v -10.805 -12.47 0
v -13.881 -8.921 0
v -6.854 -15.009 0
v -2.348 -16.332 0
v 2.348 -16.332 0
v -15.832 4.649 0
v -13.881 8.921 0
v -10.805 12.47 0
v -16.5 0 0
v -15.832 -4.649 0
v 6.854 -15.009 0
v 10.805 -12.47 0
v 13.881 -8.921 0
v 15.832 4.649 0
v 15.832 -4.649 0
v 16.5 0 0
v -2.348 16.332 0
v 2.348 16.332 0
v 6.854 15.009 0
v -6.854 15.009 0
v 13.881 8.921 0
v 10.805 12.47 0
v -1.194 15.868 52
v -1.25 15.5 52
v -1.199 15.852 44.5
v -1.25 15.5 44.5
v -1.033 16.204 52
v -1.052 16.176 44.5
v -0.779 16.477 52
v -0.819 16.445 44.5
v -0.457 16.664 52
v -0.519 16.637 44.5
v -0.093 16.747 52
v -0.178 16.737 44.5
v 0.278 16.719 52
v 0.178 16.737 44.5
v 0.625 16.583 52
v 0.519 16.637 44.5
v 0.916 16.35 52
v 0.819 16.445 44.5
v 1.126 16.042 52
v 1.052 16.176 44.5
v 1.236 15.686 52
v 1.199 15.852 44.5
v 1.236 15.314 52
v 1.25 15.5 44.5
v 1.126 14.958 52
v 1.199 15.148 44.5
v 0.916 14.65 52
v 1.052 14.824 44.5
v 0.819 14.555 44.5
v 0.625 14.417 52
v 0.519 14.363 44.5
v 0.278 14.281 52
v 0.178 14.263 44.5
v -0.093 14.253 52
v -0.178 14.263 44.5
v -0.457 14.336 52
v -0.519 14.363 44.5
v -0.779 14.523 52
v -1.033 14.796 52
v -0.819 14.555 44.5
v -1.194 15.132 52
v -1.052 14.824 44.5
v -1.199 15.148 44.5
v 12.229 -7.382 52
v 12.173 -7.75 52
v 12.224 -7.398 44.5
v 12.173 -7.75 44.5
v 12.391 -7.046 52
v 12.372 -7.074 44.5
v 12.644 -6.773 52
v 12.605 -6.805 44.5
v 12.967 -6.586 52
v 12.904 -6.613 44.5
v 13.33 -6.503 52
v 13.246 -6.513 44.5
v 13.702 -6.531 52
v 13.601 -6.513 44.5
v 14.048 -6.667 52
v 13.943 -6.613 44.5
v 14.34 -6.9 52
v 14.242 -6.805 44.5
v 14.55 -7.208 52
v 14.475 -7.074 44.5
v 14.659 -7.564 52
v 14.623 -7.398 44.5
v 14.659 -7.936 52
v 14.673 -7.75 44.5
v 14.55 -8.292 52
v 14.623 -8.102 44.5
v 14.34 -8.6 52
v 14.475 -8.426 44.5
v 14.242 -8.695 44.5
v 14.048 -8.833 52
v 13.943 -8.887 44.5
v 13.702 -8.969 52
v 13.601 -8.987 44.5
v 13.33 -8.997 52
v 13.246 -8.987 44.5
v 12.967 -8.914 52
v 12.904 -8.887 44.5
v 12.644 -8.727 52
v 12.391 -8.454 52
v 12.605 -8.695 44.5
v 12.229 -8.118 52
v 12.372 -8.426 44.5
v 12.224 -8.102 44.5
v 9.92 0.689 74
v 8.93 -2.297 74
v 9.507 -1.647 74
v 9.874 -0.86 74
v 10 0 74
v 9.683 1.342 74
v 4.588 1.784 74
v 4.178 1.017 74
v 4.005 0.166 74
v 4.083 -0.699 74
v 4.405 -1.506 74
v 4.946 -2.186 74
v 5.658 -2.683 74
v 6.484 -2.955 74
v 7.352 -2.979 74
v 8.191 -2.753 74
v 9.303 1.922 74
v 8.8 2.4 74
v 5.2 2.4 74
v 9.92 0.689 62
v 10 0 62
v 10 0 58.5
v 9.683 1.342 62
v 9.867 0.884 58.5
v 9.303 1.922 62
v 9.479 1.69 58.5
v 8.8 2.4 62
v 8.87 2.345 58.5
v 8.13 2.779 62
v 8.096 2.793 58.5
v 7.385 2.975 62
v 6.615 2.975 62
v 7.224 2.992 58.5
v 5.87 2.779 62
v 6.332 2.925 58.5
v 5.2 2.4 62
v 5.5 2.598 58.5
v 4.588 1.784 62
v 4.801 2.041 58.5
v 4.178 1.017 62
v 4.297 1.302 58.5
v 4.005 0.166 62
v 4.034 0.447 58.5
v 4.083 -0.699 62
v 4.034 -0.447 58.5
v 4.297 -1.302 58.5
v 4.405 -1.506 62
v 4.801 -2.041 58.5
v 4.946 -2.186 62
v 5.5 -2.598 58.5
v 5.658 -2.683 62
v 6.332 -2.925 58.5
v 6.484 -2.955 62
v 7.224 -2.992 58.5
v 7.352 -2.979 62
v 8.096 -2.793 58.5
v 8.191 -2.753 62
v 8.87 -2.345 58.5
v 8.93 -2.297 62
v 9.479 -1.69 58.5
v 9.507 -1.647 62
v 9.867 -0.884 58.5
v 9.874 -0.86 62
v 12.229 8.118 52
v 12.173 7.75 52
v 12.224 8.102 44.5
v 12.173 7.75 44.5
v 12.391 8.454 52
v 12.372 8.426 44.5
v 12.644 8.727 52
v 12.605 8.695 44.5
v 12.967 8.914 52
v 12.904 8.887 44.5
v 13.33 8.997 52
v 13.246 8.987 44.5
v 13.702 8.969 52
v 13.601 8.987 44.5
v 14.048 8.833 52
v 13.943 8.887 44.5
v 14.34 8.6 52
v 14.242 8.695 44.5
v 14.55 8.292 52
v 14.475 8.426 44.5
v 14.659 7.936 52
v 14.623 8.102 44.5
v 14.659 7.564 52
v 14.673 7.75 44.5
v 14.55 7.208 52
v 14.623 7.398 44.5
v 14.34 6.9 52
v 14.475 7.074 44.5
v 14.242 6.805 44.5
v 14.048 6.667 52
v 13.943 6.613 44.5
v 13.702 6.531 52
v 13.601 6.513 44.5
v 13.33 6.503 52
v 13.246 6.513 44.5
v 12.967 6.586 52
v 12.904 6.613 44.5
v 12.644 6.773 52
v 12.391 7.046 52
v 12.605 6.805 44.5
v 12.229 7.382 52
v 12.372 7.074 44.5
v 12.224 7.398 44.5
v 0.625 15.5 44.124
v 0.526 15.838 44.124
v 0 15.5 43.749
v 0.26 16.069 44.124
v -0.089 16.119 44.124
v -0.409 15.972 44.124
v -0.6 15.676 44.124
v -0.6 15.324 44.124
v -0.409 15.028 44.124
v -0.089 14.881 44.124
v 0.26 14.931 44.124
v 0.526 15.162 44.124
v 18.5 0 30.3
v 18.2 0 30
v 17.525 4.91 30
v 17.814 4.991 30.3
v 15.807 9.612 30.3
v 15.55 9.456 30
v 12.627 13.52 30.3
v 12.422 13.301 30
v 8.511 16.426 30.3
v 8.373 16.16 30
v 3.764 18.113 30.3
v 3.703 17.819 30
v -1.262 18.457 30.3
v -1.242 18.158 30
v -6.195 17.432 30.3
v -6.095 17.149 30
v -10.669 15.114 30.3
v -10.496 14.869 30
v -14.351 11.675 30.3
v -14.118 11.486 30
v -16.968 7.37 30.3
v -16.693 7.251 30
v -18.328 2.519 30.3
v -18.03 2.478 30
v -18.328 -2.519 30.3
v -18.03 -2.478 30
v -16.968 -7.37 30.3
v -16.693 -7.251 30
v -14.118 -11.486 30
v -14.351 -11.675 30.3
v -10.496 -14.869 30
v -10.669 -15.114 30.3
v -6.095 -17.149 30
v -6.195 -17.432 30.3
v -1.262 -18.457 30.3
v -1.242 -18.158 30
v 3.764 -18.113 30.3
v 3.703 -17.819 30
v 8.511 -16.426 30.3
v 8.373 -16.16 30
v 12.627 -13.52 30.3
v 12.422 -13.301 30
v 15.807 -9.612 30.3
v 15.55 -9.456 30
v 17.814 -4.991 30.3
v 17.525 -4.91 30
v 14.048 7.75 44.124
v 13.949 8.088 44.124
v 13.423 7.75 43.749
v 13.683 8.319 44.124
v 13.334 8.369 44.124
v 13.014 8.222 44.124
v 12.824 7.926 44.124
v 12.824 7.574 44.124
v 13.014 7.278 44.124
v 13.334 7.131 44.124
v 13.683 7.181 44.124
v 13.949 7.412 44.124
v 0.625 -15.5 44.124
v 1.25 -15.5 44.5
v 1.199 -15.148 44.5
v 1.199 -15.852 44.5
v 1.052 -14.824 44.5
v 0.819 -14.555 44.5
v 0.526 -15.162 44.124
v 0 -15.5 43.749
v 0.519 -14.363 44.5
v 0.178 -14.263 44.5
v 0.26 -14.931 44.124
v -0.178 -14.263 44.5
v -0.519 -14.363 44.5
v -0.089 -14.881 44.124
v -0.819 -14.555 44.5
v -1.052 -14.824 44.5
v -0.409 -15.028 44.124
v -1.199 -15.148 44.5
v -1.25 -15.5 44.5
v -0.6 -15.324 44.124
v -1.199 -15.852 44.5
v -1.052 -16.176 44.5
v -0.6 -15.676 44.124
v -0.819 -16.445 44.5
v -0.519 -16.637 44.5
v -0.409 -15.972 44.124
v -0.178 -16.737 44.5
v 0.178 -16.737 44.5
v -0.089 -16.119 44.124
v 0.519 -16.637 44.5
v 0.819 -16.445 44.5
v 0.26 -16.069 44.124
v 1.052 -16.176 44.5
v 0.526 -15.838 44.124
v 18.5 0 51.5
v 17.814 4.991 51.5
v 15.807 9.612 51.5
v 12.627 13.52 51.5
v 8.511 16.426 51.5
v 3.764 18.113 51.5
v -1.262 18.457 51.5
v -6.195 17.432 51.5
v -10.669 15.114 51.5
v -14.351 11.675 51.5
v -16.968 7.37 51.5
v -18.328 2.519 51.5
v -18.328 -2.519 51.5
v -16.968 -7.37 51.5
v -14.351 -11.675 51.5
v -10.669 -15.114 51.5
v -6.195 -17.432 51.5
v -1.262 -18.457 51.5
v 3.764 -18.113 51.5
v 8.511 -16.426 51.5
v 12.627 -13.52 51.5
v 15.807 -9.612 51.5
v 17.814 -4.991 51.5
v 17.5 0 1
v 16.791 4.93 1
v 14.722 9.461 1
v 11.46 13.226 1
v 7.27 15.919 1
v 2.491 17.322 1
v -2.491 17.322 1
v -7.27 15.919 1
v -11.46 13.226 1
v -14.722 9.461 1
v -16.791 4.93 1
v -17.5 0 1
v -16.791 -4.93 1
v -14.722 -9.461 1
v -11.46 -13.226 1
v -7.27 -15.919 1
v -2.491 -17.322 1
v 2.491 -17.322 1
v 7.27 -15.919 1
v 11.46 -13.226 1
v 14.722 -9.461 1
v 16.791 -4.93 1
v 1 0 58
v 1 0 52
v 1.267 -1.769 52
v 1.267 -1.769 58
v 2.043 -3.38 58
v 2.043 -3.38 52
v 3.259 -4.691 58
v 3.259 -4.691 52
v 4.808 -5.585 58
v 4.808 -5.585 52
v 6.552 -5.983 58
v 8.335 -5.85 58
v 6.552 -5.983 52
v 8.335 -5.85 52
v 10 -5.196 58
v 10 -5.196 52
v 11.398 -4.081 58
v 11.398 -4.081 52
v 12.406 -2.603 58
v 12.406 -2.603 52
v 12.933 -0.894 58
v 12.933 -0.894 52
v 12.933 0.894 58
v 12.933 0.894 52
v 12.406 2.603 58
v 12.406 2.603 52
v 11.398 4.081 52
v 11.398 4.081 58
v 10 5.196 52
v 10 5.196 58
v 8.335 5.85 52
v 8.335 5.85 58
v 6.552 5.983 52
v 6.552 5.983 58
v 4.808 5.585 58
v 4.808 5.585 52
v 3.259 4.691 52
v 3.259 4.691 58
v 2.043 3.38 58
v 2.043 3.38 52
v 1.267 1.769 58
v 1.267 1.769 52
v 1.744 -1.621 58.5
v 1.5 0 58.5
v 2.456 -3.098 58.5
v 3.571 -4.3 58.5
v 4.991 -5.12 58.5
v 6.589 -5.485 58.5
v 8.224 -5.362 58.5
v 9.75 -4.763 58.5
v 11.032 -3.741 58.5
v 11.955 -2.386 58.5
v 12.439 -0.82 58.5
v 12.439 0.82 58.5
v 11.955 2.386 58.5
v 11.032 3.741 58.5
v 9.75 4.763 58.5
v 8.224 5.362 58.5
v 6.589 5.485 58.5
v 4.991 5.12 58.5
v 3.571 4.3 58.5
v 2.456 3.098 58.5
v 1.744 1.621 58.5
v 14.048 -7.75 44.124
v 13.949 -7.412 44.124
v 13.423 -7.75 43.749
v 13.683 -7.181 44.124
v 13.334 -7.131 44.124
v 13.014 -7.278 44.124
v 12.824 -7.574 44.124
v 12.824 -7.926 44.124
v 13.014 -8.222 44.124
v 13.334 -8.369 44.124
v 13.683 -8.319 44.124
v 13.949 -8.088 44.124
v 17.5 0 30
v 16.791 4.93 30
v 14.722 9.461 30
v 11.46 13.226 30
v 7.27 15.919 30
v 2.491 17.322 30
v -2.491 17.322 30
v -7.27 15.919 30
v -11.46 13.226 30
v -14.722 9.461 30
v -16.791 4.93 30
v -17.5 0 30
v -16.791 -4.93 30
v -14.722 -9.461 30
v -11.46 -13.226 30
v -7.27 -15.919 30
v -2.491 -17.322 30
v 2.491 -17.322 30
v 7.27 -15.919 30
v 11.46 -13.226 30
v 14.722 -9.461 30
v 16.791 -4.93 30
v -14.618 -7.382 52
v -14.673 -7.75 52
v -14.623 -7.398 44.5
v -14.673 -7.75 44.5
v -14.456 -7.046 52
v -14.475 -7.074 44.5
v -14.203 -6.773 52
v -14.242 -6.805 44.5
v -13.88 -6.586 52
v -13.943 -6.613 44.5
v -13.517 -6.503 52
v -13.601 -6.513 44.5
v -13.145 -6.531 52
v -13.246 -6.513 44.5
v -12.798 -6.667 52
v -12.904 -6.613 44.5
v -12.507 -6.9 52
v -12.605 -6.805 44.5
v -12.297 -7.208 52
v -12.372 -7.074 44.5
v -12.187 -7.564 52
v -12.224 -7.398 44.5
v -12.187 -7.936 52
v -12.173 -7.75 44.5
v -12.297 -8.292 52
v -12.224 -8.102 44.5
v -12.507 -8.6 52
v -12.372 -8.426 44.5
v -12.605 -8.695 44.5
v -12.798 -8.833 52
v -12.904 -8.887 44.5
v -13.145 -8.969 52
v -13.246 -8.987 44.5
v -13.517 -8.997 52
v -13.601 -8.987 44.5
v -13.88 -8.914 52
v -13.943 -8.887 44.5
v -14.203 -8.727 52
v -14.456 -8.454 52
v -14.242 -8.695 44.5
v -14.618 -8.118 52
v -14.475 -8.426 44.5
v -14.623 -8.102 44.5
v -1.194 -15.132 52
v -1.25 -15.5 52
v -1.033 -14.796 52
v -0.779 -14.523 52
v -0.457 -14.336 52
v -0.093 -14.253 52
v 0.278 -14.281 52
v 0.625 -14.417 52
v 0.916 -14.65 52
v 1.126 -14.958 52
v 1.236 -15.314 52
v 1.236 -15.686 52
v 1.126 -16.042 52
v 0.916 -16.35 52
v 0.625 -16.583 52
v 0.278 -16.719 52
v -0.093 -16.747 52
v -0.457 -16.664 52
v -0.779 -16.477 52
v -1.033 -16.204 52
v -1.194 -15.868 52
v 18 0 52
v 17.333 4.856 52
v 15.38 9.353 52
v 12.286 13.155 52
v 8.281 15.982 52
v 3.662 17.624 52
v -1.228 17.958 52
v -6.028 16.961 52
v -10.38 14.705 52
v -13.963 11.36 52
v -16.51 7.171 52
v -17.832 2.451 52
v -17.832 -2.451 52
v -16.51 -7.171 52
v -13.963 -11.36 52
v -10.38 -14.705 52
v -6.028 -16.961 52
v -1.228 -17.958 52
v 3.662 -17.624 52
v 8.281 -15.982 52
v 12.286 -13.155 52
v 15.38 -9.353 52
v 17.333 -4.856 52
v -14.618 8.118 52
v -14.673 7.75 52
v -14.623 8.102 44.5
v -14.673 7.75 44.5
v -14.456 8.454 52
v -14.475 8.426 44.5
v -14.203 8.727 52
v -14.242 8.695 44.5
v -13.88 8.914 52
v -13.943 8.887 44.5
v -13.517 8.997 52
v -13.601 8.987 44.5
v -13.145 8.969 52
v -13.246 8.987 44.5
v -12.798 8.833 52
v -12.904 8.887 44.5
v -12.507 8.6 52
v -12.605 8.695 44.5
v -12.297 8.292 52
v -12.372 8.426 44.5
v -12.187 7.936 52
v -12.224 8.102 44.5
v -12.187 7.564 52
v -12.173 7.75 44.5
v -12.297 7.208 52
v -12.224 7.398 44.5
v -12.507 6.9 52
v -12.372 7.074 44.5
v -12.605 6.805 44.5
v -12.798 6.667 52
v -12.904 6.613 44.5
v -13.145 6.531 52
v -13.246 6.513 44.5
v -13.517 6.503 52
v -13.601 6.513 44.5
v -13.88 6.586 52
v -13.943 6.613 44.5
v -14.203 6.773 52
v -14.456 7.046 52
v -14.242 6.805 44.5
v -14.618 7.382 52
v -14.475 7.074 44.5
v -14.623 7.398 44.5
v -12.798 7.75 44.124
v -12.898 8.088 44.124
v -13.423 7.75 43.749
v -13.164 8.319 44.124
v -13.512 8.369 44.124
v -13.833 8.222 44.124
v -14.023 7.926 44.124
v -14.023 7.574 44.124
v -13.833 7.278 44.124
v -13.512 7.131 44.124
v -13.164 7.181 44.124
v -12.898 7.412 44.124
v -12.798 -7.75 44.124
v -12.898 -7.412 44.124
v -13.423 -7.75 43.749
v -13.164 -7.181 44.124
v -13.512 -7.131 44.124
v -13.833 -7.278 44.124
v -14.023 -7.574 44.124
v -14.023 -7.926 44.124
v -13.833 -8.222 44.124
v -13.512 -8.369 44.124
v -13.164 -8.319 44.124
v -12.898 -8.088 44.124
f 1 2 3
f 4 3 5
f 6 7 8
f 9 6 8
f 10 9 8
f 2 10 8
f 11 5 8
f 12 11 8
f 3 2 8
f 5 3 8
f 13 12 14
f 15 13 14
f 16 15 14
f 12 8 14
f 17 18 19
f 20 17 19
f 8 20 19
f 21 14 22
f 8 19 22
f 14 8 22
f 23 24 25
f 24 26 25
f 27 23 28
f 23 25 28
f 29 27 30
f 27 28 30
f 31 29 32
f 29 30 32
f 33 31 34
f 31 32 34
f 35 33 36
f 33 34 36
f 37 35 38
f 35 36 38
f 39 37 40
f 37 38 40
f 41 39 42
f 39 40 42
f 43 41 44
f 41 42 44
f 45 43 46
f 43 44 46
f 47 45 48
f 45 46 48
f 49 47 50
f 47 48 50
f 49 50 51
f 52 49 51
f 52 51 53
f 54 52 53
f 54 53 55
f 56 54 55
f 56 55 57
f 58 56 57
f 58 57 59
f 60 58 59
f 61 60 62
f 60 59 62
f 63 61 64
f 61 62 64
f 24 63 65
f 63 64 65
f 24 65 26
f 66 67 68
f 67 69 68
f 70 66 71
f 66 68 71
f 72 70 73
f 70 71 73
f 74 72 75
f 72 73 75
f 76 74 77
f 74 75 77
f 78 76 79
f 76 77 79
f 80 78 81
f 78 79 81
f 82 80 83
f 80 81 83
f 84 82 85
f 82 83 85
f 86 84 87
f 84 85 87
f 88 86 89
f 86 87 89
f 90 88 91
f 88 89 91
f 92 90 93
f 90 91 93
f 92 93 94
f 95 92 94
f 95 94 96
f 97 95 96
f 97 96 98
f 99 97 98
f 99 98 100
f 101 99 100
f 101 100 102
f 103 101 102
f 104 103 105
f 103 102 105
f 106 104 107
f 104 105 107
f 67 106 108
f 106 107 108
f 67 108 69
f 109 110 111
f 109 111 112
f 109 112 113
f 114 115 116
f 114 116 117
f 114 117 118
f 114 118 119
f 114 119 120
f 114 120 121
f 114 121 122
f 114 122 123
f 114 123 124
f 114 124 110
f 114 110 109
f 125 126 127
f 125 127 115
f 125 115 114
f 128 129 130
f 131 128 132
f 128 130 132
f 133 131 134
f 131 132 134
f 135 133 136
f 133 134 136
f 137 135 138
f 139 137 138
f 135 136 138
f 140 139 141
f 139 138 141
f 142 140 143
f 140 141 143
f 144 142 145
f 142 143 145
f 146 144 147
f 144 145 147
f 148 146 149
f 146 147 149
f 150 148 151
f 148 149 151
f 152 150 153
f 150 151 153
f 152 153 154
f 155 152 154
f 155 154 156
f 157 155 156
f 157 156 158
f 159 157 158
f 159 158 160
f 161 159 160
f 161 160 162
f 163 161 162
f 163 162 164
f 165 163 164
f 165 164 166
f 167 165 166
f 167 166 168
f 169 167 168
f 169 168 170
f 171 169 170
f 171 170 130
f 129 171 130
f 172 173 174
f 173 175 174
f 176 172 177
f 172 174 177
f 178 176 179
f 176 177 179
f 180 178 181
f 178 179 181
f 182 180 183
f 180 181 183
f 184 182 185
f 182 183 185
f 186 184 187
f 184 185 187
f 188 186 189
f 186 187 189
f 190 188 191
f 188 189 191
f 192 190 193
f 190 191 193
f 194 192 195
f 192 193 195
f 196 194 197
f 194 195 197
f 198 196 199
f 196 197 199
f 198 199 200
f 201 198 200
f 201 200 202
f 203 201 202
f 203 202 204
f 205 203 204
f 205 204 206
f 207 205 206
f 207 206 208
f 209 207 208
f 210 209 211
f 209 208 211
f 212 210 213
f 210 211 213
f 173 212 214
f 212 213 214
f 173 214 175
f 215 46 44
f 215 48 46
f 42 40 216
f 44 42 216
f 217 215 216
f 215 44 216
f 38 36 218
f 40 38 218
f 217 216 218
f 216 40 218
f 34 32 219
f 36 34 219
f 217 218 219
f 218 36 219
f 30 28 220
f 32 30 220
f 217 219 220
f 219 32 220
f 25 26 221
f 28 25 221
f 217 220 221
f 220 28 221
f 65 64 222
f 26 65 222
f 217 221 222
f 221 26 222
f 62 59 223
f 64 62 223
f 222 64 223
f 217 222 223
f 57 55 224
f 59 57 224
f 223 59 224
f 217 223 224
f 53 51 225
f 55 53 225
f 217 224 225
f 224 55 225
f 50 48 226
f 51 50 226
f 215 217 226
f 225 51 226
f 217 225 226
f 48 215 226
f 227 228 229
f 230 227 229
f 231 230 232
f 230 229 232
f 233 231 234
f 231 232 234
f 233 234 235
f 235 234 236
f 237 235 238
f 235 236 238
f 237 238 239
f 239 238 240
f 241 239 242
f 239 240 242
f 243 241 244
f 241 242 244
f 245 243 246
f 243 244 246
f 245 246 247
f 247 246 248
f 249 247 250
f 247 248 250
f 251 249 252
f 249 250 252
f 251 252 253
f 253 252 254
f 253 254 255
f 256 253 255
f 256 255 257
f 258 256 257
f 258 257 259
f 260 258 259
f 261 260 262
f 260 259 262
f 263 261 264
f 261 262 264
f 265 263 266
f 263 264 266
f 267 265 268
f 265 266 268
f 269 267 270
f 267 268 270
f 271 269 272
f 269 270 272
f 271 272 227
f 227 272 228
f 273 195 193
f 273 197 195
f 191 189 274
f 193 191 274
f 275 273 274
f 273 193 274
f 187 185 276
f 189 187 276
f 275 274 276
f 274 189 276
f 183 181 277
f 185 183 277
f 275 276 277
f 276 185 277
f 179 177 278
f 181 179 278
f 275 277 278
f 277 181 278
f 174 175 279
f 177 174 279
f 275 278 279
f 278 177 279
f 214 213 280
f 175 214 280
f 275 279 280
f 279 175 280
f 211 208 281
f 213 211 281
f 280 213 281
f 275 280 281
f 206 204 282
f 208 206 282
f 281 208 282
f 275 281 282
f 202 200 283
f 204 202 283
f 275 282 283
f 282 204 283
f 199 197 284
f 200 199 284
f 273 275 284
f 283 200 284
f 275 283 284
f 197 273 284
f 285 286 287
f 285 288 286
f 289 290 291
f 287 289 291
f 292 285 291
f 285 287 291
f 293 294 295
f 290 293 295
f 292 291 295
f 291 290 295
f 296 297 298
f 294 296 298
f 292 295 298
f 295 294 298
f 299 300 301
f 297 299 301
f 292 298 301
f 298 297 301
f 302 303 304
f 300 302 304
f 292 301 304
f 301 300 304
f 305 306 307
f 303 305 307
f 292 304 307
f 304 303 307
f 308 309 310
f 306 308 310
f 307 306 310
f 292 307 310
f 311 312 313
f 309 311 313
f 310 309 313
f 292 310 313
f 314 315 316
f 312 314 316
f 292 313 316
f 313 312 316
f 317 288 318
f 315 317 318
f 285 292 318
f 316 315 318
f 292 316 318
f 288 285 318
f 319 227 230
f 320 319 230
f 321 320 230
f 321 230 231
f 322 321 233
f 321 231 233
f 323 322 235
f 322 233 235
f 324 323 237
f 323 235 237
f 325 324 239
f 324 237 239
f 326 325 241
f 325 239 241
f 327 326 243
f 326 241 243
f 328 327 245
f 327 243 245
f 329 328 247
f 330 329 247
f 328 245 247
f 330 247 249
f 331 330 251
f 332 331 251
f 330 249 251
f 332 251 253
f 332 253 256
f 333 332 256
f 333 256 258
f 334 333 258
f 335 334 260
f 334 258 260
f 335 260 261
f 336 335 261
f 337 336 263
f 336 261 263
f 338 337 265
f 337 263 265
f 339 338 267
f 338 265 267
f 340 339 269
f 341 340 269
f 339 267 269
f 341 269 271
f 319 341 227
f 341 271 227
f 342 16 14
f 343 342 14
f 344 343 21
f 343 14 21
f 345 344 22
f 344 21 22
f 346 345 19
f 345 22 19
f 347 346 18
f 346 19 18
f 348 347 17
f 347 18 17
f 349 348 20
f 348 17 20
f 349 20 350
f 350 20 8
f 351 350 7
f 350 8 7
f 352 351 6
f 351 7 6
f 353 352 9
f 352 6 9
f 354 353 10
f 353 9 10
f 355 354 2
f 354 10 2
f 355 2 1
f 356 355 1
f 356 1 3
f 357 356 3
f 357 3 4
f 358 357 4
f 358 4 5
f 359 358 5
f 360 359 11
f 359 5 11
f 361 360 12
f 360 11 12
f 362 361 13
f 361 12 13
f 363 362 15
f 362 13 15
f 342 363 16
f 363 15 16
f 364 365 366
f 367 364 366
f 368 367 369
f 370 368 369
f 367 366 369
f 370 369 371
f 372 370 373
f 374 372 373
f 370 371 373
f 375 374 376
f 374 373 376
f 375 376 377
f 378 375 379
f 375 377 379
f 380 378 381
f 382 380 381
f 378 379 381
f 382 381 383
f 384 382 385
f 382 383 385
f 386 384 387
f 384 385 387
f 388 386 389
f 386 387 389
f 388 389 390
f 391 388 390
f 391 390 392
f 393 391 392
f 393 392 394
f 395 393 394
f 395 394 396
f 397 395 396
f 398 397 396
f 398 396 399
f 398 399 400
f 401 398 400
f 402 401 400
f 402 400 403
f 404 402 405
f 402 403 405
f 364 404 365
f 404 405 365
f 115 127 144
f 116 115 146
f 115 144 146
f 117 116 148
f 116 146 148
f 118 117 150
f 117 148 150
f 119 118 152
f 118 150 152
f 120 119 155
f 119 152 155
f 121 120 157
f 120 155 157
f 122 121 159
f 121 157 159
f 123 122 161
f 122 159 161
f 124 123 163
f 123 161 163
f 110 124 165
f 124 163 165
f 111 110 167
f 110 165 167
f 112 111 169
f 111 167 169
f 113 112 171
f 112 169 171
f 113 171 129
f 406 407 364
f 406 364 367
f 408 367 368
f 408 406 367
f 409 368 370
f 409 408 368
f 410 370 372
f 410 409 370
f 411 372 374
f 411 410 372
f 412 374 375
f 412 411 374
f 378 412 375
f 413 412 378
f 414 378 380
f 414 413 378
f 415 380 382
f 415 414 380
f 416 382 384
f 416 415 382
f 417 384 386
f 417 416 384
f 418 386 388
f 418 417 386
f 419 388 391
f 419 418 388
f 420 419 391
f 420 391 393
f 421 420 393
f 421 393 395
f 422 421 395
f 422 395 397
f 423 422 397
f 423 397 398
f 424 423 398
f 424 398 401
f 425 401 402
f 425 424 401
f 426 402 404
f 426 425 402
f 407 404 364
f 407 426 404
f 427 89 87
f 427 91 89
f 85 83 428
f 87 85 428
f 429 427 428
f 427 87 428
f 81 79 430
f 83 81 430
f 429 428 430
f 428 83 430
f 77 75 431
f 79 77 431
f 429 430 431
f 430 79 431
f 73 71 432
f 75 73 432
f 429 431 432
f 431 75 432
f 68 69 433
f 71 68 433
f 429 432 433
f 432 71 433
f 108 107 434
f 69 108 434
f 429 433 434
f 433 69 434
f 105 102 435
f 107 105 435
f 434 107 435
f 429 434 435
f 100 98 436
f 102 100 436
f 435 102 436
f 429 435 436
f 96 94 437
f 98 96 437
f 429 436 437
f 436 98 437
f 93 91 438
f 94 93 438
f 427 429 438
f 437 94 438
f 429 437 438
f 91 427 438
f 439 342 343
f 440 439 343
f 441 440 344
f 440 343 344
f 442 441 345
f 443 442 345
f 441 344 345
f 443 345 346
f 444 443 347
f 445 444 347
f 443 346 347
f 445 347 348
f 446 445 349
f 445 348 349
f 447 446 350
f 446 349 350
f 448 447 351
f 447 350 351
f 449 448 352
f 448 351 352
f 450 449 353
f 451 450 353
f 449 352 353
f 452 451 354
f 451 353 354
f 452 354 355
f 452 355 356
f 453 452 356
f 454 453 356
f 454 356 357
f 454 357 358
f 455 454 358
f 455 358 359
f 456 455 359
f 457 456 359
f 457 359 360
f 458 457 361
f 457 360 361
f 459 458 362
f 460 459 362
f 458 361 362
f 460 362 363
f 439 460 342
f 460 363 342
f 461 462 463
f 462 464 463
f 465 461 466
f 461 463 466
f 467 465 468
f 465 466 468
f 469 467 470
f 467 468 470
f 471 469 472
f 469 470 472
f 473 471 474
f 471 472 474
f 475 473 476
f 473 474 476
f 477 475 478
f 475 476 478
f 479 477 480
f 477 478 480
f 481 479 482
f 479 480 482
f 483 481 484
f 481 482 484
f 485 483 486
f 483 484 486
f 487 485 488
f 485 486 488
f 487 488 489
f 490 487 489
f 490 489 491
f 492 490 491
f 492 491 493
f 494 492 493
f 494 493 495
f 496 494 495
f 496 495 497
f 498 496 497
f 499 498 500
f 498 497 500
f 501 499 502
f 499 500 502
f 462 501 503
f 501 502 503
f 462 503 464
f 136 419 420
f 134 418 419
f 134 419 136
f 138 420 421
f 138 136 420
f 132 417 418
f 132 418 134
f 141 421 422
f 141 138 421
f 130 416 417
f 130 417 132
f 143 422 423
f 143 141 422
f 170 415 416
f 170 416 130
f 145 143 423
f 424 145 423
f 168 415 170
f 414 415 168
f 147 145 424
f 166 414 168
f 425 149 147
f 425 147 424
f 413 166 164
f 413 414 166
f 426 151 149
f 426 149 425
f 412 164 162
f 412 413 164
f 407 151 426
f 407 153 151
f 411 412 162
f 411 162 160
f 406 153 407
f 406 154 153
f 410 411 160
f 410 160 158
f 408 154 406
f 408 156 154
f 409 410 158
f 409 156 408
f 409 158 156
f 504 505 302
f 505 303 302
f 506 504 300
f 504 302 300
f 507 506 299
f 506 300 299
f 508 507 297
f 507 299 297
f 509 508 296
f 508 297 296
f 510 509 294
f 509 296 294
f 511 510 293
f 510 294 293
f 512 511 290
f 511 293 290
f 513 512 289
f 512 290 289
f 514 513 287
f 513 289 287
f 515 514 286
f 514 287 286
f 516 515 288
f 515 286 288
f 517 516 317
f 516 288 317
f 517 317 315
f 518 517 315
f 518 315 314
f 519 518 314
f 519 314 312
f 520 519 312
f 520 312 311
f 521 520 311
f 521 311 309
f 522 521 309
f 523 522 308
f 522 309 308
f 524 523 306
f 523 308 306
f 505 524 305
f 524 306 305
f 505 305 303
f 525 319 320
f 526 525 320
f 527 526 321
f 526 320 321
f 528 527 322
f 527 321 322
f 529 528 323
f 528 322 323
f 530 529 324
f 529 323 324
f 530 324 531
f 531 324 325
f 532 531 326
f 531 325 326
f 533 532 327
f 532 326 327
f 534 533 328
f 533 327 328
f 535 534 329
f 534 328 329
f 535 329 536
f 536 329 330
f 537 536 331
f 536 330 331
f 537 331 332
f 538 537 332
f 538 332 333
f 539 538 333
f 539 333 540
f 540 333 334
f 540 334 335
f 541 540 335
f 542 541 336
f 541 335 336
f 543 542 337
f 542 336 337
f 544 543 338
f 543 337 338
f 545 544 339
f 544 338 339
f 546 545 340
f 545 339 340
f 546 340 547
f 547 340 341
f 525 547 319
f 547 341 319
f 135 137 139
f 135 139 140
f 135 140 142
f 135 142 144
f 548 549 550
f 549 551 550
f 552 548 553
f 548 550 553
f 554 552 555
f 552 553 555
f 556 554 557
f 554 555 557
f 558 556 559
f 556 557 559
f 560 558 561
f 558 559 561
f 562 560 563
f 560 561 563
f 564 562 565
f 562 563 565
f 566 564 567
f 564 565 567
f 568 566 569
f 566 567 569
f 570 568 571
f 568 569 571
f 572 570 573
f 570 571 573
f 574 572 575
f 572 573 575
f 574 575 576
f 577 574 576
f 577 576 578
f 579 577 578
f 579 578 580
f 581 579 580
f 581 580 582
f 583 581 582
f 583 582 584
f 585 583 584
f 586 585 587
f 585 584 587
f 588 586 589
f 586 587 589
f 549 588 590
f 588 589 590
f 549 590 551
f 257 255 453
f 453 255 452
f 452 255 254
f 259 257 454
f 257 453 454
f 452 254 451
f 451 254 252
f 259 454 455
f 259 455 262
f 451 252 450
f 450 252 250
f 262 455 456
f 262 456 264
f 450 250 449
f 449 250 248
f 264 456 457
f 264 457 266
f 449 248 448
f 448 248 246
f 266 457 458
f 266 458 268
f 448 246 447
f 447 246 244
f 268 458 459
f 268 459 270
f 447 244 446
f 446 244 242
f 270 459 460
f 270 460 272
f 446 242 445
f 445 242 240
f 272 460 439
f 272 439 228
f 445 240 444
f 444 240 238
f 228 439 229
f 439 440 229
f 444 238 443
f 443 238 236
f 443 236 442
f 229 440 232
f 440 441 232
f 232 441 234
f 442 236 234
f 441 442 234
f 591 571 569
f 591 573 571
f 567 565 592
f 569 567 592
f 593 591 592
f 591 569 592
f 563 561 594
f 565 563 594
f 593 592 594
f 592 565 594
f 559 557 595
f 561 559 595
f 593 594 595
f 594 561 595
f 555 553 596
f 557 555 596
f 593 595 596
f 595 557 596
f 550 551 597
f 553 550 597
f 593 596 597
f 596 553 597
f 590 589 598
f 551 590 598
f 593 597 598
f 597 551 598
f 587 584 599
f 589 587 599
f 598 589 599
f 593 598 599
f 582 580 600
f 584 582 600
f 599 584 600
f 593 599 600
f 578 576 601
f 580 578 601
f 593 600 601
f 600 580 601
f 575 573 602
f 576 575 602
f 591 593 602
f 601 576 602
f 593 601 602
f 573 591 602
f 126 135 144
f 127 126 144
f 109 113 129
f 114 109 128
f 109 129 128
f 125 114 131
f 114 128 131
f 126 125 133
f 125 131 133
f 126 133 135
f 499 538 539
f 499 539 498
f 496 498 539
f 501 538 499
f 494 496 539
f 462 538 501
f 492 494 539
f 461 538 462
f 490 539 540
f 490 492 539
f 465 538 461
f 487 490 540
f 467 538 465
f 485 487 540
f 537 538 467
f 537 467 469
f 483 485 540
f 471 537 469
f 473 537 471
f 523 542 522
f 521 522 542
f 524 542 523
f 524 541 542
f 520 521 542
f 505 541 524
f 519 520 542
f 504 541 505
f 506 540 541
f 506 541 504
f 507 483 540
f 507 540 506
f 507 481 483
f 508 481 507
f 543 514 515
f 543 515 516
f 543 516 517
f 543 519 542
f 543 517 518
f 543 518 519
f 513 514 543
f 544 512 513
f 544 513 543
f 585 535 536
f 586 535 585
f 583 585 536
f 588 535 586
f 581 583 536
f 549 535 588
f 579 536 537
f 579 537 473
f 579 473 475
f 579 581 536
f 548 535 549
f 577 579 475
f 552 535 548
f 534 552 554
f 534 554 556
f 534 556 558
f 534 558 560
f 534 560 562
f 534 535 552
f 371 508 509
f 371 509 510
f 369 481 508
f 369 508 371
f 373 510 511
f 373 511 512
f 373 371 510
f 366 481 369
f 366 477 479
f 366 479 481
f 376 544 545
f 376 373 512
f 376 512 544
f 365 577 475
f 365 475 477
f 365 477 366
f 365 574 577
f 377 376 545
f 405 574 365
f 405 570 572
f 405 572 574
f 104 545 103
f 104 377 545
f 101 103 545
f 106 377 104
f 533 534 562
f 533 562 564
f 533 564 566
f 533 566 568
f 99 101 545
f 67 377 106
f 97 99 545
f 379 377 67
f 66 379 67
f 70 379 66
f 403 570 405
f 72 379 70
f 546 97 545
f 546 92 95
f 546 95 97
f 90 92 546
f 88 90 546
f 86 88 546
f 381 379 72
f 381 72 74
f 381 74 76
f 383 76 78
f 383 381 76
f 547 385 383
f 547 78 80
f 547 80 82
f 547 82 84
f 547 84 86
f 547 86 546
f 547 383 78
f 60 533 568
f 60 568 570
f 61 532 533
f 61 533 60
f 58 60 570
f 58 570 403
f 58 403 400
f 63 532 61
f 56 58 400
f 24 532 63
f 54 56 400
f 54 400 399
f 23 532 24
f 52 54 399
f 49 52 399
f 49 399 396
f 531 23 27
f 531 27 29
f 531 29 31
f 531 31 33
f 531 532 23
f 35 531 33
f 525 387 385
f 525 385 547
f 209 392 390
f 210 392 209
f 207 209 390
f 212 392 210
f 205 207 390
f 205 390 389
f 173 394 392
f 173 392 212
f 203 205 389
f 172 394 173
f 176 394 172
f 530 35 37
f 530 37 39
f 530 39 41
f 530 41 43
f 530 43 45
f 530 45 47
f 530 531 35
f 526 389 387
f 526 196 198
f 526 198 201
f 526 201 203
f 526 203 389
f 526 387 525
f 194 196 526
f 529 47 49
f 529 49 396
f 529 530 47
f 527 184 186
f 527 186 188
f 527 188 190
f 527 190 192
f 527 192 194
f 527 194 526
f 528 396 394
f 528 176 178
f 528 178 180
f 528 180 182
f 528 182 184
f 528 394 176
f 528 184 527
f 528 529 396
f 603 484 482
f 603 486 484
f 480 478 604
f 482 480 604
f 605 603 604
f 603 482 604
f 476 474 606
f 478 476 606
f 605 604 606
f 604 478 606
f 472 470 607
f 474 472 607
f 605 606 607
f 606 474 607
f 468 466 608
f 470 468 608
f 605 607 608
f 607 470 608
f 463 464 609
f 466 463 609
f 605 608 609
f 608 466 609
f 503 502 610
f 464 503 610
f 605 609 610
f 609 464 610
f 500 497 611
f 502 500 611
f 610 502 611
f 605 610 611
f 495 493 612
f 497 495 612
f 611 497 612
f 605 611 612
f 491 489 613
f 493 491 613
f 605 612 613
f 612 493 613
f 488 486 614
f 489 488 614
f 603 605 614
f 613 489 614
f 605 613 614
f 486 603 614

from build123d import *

# Parameters (mm, degrees)
SKETCH2_R                 = 17.5
BOSS_EXTRUDE1_DEPTH       = 30
SKETCH3_R                 = 18.5
BOSS_EXTRUDE2_DEPTH       = 22
M3X0_5_TAPPED_HOLE1_D     = 2.5
M3X0_5_TAPPED_HOLE1_DEPTH = 7.5
M3X0_5_TAPPED_HOLE1_TIP   = 0.751075774
SKETCH6_R                 = 6
BOSS_EXTRUDE3_DEPTH       = 6.5
SKETCH8_R                 = 3
BOSS_EXTRUDE4_DEPTH       = 3.5
BOSS_EXTRUDE5_DEPTH       = 12
CHAMFER1_SIZE             = 0.5
CHAMFER2_SIZE             = 0.5
CHAMFER3_SIZE             = 0.3
CHAMFER4_SIZE             = 1


with BuildPart() as part:
    # Sketch2 → Boss-Extrude1 (new body)
    with BuildSketch(Plane.XY):
        Circle(SKETCH2_R)
    extrude(amount=BOSS_EXTRUDE1_DEPTH)

    # Sketch3 → Boss-Extrude2 (add)
    with BuildSketch(Plane.XY.offset(30)):
        Circle(SKETCH3_R)
    extrude(amount=BOSS_EXTRUDE2_DEPTH)

    # M3x0.5 Tapped Hole1
    with Locations(Plane.XY.offset(52)):
        with Locations((13.423393759, -7.75), (13.423393759, 7.75), (0, 15.5), (-13.423393759, 7.75), (-13.423393759, -7.75), (0, -15.5)):
            Hole(M3X0_5_TAPPED_HOLE1_D / 2, depth=M3X0_5_TAPPED_HOLE1_DEPTH)
            with Locations((0, 0, -(M3X0_5_TAPPED_HOLE1_DEPTH + M3X0_5_TAPPED_HOLE1_TIP / 2))):  # 118° drill point
                Cone(0, M3X0_5_TAPPED_HOLE1_D / 2, M3X0_5_TAPPED_HOLE1_TIP, mode=Mode.SUBTRACT)

    # Sketch6 → Boss-Extrude3 (add)
    with BuildSketch(Plane.XY.offset(52)):
        with Locations((7, 0)):
            Circle(SKETCH6_R)
    extrude(amount=BOSS_EXTRUDE3_DEPTH)

    # Sketch8 → Boss-Extrude4 (add)
    with BuildSketch(Plane.XY.offset(58.5)):
        with Locations((7, 0)):
            Circle(SKETCH8_R)
    extrude(amount=BOSS_EXTRUDE4_DEPTH)

    # Sketch9 → Boss-Extrude5 (add)
    with BuildSketch(Plane.XY.offset(62)):
        with BuildLine():
            Line((8.8, 2.4), (5.2, 2.4))
            ThreePointArc((5.2, 2.4), (5.658359214, -2.683281573), (10, 0))
            ThreePointArc((10, 0), (9.683281573, 1.341640786), (8.8, 2.4))
        make_face()
    extrude(amount=BOSS_EXTRUDE5_DEPTH)

    # Chamfer1
    chamfer1_edges = [part.edges().sort_by_distance(p)[0] for p in [
        (-18.5, 0, 52),
    ]]
    chamfer(chamfer1_edges, length=CHAMFER1_SIZE)

    # Chamfer2
    chamfer2_edges = [part.edges().sort_by_distance(p)[0] for p in [
        (1, 0, 58.5),
    ]]
    chamfer(chamfer2_edges, length=CHAMFER2_SIZE)

    # Chamfer3
    chamfer3_edges = [part.edges().sort_by_distance(p)[0] for p in [
        (-18.5, 0, 30),
    ]]
    chamfer(chamfer3_edges, length=CHAMFER3_SIZE)

    # Chamfer4
    chamfer4_edges = [part.edges().sort_by_distance(p)[0] for p in [
        (-17.5, 0, 0),
    ]]
    chamfer(chamfer4_edges, length=CHAMFER4_SIZE)


solid = part.part
